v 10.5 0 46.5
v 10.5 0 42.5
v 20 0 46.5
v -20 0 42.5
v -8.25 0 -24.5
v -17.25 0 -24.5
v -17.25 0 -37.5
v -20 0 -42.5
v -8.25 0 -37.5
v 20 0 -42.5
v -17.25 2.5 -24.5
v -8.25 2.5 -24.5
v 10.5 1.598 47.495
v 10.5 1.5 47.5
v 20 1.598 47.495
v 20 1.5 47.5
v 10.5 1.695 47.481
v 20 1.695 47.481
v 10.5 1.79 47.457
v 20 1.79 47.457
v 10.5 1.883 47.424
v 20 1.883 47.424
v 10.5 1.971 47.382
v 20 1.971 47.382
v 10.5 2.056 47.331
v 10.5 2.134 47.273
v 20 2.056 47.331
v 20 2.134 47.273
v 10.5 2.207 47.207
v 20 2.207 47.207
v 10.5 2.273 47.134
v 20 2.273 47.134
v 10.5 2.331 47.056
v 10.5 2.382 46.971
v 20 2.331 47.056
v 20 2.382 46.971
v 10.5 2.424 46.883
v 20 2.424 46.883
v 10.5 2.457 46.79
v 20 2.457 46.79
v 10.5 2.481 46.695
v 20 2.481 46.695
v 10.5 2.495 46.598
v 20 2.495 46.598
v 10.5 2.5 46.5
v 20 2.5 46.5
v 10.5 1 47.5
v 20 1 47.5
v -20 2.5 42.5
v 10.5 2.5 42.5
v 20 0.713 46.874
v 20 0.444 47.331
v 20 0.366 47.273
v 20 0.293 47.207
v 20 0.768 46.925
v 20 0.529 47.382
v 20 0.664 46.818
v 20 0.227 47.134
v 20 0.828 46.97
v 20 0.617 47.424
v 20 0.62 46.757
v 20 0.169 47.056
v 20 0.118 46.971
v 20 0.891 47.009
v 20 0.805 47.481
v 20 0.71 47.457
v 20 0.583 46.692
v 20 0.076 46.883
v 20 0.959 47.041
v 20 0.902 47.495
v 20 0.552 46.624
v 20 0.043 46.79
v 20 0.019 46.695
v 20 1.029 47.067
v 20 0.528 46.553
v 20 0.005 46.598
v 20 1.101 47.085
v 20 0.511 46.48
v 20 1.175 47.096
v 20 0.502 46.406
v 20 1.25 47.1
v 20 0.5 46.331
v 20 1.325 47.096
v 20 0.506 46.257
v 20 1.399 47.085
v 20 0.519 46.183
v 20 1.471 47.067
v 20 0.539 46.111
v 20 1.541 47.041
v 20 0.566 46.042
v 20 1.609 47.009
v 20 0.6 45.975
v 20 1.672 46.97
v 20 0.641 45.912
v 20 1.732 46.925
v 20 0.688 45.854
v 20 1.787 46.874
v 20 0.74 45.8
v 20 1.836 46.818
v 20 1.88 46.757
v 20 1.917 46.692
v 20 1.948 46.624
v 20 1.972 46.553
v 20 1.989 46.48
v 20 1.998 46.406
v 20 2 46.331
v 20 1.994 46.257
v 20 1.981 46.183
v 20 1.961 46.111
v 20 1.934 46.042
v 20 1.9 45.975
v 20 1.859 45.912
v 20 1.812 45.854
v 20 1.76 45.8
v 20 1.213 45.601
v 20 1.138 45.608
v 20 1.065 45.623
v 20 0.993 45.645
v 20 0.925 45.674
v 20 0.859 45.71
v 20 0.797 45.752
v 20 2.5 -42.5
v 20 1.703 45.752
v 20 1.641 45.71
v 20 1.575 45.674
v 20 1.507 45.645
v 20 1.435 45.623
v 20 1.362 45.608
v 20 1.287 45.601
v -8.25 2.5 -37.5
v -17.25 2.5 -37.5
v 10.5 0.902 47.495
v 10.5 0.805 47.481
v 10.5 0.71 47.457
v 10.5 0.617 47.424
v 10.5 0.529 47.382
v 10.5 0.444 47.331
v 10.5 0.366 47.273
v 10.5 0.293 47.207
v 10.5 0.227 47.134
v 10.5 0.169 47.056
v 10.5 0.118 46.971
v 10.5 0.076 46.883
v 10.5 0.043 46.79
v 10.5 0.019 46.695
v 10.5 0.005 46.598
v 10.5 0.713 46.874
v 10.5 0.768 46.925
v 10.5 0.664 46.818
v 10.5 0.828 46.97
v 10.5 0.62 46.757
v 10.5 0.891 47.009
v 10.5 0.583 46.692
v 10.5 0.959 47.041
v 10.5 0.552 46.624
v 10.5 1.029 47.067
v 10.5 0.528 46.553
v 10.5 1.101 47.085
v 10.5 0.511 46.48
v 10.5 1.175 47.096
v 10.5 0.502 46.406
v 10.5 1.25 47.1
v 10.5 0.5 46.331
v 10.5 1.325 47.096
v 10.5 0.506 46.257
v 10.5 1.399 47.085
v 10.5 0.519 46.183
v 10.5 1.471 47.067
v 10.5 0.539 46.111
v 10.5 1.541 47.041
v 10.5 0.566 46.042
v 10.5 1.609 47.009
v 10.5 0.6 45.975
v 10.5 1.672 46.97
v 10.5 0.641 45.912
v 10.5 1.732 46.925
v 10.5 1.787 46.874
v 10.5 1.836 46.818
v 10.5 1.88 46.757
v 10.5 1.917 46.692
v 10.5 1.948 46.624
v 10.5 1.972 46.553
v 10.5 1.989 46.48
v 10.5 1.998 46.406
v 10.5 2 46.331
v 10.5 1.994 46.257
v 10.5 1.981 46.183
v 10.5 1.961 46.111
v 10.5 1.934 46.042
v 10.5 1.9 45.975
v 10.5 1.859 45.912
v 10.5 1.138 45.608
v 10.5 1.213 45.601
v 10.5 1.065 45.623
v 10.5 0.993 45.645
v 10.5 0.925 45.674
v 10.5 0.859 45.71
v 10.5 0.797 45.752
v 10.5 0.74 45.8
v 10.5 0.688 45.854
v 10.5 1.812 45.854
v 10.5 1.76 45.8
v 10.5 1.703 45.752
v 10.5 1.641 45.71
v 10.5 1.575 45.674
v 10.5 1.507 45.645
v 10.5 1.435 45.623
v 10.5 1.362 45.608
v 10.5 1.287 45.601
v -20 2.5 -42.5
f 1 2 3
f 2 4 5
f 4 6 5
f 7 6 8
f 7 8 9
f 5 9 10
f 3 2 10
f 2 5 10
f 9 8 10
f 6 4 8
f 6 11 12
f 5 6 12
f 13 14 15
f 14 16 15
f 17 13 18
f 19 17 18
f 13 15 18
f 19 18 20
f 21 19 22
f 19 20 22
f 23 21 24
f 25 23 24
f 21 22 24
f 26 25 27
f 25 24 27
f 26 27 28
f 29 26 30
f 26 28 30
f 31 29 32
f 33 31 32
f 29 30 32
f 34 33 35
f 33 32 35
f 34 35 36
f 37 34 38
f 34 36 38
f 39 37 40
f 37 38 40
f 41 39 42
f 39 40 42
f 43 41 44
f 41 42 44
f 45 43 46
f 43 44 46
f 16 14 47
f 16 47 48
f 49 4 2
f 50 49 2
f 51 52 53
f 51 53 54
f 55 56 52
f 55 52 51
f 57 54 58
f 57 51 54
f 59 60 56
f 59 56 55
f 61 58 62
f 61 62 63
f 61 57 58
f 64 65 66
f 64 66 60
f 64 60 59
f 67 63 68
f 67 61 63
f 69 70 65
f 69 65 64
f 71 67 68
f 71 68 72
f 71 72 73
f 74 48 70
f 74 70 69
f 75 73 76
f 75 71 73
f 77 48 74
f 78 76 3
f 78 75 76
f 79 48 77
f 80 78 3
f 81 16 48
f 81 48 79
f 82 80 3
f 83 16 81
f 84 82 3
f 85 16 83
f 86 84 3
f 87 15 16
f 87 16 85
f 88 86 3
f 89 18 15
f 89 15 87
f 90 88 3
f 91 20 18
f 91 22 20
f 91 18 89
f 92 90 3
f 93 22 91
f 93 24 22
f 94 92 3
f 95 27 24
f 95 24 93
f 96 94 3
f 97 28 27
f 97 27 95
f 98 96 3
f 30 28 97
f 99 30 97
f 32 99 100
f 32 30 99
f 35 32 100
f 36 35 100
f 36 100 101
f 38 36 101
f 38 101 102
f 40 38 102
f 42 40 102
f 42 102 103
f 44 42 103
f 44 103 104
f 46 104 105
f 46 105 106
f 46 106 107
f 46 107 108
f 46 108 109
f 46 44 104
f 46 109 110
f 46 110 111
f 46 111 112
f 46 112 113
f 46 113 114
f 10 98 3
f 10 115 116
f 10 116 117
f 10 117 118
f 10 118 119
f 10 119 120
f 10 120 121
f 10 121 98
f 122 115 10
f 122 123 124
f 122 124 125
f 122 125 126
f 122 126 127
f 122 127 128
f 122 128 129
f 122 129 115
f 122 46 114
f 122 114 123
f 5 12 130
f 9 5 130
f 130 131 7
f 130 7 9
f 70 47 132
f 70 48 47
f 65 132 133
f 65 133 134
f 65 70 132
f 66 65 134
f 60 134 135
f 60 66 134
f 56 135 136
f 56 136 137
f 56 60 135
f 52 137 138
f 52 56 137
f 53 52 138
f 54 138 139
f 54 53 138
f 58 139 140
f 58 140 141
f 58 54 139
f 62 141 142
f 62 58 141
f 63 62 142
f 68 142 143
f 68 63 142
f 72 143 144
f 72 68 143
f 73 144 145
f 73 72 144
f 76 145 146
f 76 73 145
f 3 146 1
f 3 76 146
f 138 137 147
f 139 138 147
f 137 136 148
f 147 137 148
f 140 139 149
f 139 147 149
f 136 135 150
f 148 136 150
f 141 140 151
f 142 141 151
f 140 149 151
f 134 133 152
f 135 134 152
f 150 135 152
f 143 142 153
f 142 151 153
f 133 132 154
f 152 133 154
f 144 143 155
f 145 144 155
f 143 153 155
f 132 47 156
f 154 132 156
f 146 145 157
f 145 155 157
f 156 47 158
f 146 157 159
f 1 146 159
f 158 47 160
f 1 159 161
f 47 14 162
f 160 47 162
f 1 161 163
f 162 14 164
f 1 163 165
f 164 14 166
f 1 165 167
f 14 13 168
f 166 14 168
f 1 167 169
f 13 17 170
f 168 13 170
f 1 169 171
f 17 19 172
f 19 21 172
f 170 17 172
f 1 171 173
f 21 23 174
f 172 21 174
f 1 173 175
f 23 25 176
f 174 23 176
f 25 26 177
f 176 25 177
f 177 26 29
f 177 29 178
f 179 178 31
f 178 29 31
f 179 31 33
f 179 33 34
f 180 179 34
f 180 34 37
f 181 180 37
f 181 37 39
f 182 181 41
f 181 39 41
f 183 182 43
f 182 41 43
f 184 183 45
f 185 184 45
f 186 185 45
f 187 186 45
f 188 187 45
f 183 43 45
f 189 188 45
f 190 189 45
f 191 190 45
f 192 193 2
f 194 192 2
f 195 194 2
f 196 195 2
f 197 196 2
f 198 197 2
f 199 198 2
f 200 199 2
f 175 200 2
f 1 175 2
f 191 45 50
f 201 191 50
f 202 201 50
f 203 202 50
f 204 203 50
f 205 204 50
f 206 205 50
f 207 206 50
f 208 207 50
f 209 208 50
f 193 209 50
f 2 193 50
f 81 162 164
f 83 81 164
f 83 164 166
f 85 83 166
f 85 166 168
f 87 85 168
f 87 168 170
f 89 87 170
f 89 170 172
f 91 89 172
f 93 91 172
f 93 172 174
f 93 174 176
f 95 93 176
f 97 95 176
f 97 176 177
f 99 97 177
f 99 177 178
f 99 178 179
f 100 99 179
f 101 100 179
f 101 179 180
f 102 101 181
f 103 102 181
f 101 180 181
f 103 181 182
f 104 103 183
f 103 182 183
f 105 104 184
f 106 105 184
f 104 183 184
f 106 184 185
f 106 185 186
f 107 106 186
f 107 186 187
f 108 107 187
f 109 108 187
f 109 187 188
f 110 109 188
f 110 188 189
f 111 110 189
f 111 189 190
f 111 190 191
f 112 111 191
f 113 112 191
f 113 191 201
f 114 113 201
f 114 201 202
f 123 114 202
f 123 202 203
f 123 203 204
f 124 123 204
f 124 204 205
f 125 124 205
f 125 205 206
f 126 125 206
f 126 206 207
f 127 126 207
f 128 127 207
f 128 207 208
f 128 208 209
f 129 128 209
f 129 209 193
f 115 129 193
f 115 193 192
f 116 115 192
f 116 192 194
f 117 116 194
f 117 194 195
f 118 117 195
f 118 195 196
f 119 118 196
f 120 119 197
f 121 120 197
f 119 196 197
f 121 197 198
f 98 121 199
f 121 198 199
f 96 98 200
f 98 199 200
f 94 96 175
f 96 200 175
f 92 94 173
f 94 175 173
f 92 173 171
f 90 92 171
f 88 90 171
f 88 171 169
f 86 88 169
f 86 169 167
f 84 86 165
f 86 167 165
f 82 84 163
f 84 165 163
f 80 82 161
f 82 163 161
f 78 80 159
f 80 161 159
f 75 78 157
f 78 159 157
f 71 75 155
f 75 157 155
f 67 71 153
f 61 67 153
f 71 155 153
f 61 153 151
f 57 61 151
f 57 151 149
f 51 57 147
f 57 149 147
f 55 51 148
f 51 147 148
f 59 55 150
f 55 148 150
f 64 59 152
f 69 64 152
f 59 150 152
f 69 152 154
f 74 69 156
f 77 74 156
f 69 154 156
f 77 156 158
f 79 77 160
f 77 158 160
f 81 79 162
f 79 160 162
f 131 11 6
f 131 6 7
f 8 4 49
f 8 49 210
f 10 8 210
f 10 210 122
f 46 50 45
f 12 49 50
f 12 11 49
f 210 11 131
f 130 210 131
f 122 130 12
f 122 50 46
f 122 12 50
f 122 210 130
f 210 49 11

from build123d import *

# Parameters (mm, degrees)
SKETCH4_W           = 40
SKETCH4_H           = 85
BOSS_EXTRUDE1_DEPTH = 2.5
SKETCH5_W           = 9.5
SKETCH5_H           = 5
BOSS_EXTRUDE2_DEPTH = 2.5
SKETCH12_W          = 9
SKETCH12_H          = 13
CUT_EXTRUDE1_DEPTH  = 5
FILLET4_R           = 1
FILLET5_R           = 1
SKETCH13_R          = 0.75
CUT_EXTRUDE2_DEPTH  = 10


with BuildPart() as part:
    # Sketch4 → Boss-Extrude1 (new body)
    with BuildSketch(Plane(origin=(0, 0, 0), x_dir=(1, 0, 0), z_dir=(0, 1, 0))):
        Rectangle(SKETCH4_W, SKETCH4_H)
    extrude(amount=BOSS_EXTRUDE1_DEPTH)

    # Sketch5 → Boss-Extrude2 (add)
    with BuildSketch(Plane(origin=(0, 2.5, 0), x_dir=(1, 0, 0), z_dir=(0, 1, 0))):
        with Locations((15.25, -45)):
            Rectangle(SKETCH5_W, SKETCH5_H)
    extrude(amount=-BOSS_EXTRUDE2_DEPTH)

    # Sketch12 → Cut-Extrude1 (cut)
    with BuildSketch(Plane(origin=(0, 2.5, 0), x_dir=(1, 0, 0), z_dir=(0, 1, 0))):
        with Locations((-12.75, 31)):
            Rectangle(SKETCH12_W, SKETCH12_H)
    extrude(amount=-CUT_EXTRUDE1_DEPTH, mode=Mode.SUBTRACT)

    # Fillet4
    fillet4_edges = [part.edges().sort_by_distance(p)[0] for p in [
        (15.25, 2.5, 47.5),
    ]]
    fillet(fillet4_edges, radius=FILLET4_R)

    # Fillet5
    fillet5_edges = [part.edges().sort_by_distance(p)[0] for p in [
        (15.25, 0, 47.5),
    ]]
    fillet(fillet5_edges, radius=FILLET5_R)

    # Sketch13 → Cut-Extrude2 (cut)
    with BuildSketch(Plane.ZY.offset(-10.5)):
        with Locations((46.35, 1.25)):
            Circle(SKETCH13_R)
    extrude(amount=-CUT_EXTRUDE2_DEPTH, mode=Mode.SUBTRACT)


solid = part.part
